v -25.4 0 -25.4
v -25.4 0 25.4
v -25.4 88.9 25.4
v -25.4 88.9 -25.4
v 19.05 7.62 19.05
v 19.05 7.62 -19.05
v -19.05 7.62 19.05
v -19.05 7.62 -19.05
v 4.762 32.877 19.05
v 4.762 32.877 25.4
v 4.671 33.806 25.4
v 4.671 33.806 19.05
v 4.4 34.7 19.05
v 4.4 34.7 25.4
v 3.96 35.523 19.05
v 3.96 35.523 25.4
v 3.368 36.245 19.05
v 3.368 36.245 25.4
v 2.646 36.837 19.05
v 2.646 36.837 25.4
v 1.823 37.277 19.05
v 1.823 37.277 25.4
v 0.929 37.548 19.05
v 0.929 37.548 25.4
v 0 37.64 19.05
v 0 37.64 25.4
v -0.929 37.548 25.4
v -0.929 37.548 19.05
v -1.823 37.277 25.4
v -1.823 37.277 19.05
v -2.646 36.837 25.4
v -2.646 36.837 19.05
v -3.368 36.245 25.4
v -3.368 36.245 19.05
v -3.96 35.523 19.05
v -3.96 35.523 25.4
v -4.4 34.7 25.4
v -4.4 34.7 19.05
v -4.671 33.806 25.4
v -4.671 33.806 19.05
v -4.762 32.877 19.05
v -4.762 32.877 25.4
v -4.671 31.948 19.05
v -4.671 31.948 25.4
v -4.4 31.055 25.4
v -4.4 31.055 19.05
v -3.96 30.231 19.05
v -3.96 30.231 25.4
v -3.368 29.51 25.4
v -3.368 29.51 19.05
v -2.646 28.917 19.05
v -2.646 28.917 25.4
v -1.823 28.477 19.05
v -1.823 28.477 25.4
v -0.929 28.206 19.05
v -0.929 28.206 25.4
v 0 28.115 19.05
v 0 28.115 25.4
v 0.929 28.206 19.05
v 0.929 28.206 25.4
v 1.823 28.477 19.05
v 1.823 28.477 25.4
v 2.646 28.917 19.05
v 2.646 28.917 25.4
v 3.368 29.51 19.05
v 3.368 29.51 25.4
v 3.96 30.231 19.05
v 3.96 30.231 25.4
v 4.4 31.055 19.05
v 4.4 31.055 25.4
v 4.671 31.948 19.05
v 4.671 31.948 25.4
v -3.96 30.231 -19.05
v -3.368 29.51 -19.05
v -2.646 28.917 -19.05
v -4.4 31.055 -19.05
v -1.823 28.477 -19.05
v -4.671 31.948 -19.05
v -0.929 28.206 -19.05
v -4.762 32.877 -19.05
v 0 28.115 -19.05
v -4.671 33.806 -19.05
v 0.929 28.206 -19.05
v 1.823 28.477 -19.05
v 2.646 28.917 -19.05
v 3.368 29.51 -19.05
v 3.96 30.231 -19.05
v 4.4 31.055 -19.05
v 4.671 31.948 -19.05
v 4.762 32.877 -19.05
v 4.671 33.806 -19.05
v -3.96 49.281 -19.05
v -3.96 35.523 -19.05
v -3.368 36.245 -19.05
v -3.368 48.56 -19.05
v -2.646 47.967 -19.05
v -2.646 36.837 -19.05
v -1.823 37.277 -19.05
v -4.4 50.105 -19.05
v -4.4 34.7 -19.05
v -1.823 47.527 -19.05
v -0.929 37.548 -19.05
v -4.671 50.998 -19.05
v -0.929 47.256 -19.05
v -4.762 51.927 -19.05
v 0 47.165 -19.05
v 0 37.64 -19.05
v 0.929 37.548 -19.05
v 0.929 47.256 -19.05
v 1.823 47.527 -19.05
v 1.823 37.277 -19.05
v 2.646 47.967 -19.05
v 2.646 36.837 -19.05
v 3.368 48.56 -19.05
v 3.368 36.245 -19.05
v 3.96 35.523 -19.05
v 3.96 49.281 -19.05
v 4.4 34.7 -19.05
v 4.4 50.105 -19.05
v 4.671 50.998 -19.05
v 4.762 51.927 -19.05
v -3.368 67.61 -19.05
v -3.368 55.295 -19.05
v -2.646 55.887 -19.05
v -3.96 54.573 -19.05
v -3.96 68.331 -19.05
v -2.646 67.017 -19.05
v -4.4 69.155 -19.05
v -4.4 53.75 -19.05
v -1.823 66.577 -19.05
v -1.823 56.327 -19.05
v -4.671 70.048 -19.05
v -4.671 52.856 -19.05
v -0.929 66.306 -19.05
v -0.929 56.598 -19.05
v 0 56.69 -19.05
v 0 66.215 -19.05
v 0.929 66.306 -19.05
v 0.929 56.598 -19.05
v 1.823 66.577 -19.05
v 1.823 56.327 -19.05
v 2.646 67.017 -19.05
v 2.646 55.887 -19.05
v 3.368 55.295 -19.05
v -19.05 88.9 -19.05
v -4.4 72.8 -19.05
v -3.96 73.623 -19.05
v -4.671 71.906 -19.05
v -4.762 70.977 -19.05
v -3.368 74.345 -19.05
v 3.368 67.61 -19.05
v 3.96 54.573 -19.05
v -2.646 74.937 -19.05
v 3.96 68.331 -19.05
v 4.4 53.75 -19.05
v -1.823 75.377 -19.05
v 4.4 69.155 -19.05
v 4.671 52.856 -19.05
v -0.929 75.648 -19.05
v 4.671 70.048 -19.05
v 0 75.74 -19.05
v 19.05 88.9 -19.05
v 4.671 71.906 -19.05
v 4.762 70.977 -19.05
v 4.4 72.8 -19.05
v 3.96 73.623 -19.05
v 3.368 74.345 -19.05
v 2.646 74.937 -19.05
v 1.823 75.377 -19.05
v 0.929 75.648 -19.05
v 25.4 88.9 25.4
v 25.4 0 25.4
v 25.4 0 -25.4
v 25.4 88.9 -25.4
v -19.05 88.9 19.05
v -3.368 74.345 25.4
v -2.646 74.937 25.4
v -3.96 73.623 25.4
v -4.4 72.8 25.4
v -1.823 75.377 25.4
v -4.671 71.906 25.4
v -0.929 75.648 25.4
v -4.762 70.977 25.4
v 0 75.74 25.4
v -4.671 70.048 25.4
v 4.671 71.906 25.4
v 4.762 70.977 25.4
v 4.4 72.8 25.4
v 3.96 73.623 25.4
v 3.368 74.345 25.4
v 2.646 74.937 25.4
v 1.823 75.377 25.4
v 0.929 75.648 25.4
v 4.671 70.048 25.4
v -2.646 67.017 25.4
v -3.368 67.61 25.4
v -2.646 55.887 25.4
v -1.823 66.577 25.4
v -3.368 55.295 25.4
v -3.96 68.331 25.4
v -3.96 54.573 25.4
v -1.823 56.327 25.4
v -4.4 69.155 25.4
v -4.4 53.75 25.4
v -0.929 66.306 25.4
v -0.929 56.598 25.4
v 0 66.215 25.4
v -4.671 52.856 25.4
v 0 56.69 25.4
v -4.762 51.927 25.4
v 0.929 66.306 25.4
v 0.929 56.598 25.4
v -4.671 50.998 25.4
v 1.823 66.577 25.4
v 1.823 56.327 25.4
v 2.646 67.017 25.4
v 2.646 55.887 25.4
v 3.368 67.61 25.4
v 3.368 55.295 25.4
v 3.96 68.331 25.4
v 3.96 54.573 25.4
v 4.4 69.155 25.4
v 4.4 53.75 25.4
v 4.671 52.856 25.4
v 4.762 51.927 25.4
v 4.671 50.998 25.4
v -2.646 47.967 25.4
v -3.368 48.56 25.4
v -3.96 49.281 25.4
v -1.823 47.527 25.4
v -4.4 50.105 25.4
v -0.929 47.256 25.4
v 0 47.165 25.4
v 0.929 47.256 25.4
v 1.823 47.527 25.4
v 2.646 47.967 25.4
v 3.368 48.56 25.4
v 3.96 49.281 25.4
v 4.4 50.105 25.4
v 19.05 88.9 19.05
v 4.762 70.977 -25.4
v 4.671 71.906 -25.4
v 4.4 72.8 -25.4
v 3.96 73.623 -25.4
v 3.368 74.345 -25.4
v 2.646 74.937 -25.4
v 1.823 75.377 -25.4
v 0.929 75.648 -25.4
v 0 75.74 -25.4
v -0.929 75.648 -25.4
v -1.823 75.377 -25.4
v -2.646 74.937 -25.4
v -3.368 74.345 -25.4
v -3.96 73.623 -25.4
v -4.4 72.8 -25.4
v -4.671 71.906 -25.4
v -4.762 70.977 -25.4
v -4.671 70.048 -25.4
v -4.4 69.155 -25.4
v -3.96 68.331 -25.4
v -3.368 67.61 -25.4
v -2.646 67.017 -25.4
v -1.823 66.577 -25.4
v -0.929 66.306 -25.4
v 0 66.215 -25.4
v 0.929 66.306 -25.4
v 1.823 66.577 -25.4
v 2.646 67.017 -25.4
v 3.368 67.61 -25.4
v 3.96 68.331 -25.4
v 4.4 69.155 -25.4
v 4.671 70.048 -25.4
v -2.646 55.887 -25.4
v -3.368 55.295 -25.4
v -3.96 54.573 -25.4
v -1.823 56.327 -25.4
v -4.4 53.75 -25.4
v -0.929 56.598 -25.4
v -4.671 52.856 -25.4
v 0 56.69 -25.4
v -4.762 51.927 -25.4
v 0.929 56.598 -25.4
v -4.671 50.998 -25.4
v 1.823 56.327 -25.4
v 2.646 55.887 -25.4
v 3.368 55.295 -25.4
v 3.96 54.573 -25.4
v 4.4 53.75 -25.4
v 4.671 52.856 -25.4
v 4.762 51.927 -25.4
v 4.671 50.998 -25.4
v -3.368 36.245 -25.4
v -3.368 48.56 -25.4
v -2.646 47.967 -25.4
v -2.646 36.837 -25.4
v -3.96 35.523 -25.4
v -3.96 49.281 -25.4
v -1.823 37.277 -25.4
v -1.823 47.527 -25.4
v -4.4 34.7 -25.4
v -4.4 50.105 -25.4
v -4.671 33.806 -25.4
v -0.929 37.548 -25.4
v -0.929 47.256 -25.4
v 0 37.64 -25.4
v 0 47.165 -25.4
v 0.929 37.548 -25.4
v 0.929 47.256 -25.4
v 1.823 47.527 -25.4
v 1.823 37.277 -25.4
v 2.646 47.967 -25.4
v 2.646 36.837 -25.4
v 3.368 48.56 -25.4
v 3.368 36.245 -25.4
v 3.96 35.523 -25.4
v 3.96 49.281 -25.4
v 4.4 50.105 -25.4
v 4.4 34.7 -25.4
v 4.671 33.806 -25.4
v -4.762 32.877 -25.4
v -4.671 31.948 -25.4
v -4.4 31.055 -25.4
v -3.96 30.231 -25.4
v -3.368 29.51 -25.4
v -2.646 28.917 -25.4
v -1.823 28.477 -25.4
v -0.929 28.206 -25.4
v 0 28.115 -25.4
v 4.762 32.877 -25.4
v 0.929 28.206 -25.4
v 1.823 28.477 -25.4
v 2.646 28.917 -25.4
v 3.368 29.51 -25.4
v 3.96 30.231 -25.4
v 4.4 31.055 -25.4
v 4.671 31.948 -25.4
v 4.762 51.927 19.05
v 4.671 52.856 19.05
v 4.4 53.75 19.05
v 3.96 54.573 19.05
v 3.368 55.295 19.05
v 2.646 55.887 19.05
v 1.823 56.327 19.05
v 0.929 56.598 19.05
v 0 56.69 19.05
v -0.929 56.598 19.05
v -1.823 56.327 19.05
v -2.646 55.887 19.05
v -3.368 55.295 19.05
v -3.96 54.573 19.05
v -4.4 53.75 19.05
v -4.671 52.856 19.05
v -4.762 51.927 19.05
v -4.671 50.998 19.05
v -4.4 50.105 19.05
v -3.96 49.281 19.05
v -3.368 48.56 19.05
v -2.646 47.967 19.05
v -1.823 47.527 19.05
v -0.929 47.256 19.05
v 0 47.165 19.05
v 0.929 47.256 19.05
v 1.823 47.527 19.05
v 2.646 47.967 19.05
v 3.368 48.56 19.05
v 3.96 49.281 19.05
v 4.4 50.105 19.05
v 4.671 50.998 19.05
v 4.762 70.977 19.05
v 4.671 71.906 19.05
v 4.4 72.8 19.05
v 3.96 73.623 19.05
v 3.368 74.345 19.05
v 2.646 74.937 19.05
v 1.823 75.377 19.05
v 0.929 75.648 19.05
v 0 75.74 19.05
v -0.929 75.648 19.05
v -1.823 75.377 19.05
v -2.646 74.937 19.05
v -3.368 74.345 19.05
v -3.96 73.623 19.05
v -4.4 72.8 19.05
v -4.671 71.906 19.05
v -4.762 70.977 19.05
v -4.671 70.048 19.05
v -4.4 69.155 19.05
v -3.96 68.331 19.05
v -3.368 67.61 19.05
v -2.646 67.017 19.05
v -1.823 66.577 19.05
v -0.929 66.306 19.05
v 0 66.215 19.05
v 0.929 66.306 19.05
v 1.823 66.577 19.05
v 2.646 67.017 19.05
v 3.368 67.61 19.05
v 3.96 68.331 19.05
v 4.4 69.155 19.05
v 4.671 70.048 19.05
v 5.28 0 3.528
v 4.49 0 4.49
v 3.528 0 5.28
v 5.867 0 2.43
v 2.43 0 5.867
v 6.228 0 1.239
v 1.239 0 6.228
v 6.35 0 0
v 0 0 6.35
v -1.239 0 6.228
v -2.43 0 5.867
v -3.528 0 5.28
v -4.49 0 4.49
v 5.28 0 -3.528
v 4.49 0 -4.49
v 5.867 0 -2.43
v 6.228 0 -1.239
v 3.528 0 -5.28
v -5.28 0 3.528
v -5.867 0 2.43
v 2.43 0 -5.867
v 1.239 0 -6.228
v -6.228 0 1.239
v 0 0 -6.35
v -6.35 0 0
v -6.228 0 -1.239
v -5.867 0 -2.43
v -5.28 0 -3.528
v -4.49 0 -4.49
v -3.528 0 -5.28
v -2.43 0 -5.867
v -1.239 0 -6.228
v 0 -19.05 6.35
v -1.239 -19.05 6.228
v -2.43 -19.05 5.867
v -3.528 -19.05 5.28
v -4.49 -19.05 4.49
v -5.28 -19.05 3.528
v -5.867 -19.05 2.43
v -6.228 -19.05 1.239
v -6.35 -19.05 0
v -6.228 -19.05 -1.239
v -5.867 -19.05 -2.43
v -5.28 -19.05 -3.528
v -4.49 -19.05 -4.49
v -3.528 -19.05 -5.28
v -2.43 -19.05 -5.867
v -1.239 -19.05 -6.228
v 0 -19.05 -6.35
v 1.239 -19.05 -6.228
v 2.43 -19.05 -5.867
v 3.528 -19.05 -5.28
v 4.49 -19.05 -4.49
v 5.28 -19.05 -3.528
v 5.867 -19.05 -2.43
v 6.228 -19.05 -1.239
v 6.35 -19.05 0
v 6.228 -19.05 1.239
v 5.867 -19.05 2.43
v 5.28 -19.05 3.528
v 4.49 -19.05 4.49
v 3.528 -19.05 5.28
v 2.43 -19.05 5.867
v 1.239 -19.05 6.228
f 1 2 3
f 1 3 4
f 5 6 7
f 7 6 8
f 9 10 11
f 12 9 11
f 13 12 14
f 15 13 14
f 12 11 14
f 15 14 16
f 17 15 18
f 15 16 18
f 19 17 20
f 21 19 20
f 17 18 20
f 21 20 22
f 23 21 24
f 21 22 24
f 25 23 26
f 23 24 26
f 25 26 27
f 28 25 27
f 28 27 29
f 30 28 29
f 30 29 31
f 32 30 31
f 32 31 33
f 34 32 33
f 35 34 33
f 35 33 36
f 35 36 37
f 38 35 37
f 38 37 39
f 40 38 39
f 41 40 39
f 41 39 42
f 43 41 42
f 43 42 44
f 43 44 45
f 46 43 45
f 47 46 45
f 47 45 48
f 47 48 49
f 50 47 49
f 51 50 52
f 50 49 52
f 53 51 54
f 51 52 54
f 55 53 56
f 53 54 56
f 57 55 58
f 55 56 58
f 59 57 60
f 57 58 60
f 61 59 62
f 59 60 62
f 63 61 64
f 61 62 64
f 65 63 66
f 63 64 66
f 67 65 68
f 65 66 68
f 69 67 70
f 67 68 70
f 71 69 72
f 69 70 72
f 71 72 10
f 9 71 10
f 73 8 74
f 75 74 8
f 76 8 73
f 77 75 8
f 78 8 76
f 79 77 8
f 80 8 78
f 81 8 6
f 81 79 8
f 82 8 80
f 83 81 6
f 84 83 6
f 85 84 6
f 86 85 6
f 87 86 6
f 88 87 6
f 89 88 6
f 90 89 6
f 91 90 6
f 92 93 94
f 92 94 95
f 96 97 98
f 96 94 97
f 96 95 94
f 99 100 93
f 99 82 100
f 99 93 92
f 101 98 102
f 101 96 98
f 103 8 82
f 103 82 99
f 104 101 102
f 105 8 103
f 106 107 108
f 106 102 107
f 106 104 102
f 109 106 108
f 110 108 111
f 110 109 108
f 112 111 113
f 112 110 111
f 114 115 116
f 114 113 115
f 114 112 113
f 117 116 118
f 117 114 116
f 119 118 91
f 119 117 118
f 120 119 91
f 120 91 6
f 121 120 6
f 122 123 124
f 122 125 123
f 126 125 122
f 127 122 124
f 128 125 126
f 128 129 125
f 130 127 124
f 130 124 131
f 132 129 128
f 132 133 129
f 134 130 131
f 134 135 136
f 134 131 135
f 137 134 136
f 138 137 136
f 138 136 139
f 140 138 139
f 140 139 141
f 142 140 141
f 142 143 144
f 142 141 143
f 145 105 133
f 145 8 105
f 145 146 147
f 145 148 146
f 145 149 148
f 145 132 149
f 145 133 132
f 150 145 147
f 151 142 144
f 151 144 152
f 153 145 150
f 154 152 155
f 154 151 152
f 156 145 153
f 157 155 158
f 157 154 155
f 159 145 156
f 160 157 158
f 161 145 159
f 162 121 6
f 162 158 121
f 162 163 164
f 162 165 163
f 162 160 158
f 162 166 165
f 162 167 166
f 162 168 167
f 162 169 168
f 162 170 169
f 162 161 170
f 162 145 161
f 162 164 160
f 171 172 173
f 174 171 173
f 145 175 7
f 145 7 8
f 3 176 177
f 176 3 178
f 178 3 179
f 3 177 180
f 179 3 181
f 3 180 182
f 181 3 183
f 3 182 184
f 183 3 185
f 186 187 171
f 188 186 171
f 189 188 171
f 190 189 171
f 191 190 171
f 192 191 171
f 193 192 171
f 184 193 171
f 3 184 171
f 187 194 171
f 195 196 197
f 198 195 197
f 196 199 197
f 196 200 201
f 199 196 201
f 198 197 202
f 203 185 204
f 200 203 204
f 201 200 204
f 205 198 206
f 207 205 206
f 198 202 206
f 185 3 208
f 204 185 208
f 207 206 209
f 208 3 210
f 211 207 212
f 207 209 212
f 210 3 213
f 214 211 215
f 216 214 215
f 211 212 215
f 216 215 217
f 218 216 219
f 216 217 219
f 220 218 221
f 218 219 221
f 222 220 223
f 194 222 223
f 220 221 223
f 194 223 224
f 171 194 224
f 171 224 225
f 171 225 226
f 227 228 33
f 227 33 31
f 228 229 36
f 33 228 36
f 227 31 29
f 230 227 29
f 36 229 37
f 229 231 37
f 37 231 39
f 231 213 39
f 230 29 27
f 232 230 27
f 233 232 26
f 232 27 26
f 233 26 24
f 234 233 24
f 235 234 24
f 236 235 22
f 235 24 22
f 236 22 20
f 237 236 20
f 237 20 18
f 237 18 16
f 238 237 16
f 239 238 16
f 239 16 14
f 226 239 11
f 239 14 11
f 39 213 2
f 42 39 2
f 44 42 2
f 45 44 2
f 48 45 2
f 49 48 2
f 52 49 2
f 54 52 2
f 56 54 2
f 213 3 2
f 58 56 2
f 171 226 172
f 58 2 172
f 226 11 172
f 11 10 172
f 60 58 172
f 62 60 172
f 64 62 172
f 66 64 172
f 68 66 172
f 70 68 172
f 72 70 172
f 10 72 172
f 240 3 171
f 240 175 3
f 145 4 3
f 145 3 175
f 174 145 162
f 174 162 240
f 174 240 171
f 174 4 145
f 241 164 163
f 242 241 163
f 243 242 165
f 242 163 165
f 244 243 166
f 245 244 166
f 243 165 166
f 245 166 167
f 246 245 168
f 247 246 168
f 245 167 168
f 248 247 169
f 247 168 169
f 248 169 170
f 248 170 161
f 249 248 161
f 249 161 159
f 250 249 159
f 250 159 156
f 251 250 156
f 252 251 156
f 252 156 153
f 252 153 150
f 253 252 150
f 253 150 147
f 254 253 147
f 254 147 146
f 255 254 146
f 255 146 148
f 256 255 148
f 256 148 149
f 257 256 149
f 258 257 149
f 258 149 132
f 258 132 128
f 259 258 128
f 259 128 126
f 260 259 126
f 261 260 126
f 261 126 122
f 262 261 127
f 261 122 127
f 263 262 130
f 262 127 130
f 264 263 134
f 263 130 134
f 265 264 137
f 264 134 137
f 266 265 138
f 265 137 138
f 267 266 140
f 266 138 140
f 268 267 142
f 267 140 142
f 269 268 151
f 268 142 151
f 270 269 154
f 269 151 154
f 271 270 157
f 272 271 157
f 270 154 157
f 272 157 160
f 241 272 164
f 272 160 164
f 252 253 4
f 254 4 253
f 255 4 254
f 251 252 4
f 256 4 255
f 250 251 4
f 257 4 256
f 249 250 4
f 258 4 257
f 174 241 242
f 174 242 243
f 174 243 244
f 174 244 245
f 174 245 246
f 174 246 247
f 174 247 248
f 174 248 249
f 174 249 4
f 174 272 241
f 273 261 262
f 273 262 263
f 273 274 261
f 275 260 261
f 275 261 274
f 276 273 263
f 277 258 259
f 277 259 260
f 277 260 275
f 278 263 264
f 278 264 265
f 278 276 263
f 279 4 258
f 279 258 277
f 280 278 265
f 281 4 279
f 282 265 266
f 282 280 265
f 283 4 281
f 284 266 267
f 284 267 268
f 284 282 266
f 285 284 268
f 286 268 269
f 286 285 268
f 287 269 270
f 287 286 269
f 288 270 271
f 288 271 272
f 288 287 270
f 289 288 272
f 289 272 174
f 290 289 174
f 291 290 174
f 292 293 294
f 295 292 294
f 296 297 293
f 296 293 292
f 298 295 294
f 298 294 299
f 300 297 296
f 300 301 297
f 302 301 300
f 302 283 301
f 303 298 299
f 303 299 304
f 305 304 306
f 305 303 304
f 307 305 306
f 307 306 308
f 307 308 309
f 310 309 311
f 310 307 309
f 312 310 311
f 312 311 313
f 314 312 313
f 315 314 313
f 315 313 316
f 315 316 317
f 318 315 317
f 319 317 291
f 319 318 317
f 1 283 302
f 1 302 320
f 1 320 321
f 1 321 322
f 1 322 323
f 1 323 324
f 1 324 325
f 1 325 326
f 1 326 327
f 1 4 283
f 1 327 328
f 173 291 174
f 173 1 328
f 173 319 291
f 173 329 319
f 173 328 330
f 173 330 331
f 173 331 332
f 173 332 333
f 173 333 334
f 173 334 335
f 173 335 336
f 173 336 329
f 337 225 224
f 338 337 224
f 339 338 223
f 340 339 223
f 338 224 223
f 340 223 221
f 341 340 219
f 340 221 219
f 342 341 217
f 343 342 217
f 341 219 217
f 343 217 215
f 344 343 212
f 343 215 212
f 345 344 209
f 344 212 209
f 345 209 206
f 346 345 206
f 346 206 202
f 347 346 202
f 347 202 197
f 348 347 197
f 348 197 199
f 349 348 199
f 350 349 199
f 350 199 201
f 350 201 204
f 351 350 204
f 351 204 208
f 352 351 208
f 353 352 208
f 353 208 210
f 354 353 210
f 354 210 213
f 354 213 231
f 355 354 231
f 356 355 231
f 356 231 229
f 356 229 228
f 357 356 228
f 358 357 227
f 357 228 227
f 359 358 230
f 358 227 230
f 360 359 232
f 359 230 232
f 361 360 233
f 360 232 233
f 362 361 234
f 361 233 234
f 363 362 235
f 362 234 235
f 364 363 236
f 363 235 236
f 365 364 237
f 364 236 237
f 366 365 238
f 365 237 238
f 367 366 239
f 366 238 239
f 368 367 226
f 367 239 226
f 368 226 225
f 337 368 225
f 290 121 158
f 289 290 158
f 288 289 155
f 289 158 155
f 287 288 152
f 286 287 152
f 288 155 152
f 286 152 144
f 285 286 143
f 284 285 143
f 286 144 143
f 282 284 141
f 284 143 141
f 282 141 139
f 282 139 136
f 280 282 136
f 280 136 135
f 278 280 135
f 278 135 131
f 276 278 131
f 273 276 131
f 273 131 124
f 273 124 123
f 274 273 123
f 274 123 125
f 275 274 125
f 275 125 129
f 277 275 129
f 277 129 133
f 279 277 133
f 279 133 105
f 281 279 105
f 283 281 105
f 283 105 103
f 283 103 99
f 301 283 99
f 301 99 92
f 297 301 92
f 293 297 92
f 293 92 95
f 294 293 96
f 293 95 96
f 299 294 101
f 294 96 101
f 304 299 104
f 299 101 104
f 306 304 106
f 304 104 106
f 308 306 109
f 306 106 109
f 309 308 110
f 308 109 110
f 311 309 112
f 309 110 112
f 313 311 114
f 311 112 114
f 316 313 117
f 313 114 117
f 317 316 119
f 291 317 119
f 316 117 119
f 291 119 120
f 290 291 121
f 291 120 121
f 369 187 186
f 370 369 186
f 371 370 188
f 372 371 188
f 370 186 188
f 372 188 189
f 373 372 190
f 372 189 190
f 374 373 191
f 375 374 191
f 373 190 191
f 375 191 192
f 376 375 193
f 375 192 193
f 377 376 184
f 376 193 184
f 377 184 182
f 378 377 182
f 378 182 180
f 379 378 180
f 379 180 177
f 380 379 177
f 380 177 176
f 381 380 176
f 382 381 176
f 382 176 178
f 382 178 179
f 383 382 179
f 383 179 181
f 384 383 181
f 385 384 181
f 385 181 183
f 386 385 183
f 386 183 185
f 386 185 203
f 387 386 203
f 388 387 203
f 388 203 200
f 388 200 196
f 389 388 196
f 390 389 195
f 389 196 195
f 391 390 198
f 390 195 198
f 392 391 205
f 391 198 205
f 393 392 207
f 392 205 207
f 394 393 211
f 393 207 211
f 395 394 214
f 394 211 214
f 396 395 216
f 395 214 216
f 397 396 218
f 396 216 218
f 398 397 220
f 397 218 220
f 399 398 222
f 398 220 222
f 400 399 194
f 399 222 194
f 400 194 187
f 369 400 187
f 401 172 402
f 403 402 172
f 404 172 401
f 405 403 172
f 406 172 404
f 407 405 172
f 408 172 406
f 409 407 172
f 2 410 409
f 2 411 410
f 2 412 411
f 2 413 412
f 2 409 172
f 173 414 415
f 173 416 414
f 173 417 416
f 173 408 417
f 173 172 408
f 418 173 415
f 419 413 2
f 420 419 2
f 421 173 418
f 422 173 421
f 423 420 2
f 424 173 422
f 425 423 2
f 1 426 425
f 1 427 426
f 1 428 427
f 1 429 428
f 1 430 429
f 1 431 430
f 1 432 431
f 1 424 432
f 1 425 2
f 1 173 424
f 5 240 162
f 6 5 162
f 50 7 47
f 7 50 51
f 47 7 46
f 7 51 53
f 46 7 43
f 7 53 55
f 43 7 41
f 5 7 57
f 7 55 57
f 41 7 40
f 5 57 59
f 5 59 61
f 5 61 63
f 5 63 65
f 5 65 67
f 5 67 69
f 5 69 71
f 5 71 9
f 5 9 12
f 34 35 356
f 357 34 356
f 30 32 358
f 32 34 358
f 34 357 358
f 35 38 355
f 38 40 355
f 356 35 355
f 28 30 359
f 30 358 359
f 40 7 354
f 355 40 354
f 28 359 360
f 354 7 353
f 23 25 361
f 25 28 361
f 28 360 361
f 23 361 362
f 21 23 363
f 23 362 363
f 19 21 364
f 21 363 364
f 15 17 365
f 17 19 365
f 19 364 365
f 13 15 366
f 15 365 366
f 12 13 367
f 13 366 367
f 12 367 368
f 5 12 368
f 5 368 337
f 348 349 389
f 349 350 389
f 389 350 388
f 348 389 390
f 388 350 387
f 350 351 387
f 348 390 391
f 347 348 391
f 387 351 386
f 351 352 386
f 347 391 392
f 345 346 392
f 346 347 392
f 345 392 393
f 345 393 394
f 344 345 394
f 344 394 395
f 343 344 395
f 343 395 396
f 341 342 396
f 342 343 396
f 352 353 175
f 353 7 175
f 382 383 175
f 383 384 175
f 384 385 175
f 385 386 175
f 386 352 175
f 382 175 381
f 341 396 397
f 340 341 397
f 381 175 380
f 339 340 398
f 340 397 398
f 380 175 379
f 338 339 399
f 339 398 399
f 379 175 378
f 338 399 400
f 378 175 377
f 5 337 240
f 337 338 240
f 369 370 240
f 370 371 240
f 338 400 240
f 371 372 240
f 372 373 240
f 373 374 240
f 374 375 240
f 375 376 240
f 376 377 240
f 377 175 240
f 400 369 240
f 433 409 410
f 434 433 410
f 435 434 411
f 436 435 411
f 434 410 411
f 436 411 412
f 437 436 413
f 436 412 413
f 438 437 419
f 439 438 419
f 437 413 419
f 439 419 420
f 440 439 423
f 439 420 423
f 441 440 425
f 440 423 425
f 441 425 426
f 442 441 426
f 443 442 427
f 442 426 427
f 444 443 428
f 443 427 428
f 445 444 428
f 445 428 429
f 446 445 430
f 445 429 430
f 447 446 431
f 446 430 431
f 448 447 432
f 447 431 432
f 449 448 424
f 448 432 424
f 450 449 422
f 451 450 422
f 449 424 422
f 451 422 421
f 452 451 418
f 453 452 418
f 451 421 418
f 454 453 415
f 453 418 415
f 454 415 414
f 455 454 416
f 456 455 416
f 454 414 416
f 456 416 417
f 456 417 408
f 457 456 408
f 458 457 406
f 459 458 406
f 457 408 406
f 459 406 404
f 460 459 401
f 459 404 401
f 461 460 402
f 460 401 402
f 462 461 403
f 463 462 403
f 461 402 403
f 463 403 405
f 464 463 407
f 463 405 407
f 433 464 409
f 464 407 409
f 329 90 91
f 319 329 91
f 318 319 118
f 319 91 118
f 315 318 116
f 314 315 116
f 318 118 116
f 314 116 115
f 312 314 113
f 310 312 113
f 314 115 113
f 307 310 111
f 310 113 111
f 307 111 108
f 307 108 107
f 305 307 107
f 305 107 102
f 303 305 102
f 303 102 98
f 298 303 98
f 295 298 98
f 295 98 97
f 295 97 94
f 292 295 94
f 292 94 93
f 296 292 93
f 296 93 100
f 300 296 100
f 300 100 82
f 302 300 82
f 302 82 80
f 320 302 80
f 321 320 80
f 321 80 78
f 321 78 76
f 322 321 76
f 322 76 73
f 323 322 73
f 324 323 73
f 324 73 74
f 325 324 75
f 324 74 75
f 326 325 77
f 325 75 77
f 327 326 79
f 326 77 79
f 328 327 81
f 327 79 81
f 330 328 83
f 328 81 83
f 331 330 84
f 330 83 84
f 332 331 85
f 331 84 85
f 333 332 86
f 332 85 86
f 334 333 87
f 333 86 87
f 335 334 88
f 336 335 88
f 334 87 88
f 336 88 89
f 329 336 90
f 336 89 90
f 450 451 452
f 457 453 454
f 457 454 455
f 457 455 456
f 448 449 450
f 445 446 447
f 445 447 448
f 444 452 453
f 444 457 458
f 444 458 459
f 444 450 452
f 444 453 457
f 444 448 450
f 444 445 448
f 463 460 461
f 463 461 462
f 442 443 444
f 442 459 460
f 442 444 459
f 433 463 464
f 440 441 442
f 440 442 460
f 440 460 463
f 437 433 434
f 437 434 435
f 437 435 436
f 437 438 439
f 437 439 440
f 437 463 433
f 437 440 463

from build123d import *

# Parameters (mm, degrees)
SKETCH1_W           = 50.8
SKETCH1_H           = 50.8
BOSS_EXTRUDE1_DEPTH = 88.9
SKETCH2_W           = 38.1
SKETCH2_H           = 38.1
CUT_EXTRUDE1_DEPTH  = 96.882897328
SKETCH3_W           = 38.1
SKETCH3_H           = 38.1
BOSS_EXTRUDE2_DEPTH = 7.62
SKETCH4_R           = 6.35
BOSS_EXTRUDE3_DEPTH = 19.05
SKETCH6_R           = 4.7625
CUT_EXTRUDE2_DEPTH  = 106.494123059


with BuildPart() as part:
    # Sketch1 → Boss-Extrude1 (new body)
    with BuildSketch(Plane(origin=(0, 0, 0), x_dir=(1, 0, 0), z_dir=(0, 1, 0))):
        Rectangle(SKETCH1_W, SKETCH1_H)
    extrude(amount=BOSS_EXTRUDE1_DEPTH)

    # Sketch2 → Cut-Extrude1 (cut, through all)
    with BuildSketch(Plane(origin=(0, 88.9, 0), x_dir=(1, 0, 0), z_dir=(0, 1, 0))):
        Rectangle(SKETCH2_W, SKETCH2_H)
    extrude(amount=-CUT_EXTRUDE1_DEPTH, mode=Mode.SUBTRACT)

    # Sketch3 → Boss-Extrude2 (add)
    with BuildSketch(Plane(origin=(0, 0, 0), x_dir=(-1, 0, 0), z_dir=(0, -1, 0))):
        Rectangle(SKETCH3_W, SKETCH3_H)
    extrude(amount=-BOSS_EXTRUDE2_DEPTH)

    # Sketch4 → Boss-Extrude3 (add)
    with BuildSketch(Plane(origin=(0, 0, 0), x_dir=(-1, 0, 0), z_dir=(0, -1, 0))):
        with Locations(Location((0, 0, 0), (0, 0, 270))):
            Circle(SKETCH4_R)
    extrude(amount=BOSS_EXTRUDE3_DEPTH)

    # Sketch6 → Cut-Extrude2 (cut, through all)
    with BuildSketch(Plane.XY.offset(25.4)):
        with Locations((0, 70.977272932)):
            Circle(SKETCH6_R)
        with Locations((0, 51.927272932)):
            Circle(SKETCH6_R)
        with Locations((0, 32.877272932)):
            Circle(SKETCH6_R)
    extrude(amount=-CUT_EXTRUDE2_DEPTH, mode=Mode.SUBTRACT)


solid = part.part
